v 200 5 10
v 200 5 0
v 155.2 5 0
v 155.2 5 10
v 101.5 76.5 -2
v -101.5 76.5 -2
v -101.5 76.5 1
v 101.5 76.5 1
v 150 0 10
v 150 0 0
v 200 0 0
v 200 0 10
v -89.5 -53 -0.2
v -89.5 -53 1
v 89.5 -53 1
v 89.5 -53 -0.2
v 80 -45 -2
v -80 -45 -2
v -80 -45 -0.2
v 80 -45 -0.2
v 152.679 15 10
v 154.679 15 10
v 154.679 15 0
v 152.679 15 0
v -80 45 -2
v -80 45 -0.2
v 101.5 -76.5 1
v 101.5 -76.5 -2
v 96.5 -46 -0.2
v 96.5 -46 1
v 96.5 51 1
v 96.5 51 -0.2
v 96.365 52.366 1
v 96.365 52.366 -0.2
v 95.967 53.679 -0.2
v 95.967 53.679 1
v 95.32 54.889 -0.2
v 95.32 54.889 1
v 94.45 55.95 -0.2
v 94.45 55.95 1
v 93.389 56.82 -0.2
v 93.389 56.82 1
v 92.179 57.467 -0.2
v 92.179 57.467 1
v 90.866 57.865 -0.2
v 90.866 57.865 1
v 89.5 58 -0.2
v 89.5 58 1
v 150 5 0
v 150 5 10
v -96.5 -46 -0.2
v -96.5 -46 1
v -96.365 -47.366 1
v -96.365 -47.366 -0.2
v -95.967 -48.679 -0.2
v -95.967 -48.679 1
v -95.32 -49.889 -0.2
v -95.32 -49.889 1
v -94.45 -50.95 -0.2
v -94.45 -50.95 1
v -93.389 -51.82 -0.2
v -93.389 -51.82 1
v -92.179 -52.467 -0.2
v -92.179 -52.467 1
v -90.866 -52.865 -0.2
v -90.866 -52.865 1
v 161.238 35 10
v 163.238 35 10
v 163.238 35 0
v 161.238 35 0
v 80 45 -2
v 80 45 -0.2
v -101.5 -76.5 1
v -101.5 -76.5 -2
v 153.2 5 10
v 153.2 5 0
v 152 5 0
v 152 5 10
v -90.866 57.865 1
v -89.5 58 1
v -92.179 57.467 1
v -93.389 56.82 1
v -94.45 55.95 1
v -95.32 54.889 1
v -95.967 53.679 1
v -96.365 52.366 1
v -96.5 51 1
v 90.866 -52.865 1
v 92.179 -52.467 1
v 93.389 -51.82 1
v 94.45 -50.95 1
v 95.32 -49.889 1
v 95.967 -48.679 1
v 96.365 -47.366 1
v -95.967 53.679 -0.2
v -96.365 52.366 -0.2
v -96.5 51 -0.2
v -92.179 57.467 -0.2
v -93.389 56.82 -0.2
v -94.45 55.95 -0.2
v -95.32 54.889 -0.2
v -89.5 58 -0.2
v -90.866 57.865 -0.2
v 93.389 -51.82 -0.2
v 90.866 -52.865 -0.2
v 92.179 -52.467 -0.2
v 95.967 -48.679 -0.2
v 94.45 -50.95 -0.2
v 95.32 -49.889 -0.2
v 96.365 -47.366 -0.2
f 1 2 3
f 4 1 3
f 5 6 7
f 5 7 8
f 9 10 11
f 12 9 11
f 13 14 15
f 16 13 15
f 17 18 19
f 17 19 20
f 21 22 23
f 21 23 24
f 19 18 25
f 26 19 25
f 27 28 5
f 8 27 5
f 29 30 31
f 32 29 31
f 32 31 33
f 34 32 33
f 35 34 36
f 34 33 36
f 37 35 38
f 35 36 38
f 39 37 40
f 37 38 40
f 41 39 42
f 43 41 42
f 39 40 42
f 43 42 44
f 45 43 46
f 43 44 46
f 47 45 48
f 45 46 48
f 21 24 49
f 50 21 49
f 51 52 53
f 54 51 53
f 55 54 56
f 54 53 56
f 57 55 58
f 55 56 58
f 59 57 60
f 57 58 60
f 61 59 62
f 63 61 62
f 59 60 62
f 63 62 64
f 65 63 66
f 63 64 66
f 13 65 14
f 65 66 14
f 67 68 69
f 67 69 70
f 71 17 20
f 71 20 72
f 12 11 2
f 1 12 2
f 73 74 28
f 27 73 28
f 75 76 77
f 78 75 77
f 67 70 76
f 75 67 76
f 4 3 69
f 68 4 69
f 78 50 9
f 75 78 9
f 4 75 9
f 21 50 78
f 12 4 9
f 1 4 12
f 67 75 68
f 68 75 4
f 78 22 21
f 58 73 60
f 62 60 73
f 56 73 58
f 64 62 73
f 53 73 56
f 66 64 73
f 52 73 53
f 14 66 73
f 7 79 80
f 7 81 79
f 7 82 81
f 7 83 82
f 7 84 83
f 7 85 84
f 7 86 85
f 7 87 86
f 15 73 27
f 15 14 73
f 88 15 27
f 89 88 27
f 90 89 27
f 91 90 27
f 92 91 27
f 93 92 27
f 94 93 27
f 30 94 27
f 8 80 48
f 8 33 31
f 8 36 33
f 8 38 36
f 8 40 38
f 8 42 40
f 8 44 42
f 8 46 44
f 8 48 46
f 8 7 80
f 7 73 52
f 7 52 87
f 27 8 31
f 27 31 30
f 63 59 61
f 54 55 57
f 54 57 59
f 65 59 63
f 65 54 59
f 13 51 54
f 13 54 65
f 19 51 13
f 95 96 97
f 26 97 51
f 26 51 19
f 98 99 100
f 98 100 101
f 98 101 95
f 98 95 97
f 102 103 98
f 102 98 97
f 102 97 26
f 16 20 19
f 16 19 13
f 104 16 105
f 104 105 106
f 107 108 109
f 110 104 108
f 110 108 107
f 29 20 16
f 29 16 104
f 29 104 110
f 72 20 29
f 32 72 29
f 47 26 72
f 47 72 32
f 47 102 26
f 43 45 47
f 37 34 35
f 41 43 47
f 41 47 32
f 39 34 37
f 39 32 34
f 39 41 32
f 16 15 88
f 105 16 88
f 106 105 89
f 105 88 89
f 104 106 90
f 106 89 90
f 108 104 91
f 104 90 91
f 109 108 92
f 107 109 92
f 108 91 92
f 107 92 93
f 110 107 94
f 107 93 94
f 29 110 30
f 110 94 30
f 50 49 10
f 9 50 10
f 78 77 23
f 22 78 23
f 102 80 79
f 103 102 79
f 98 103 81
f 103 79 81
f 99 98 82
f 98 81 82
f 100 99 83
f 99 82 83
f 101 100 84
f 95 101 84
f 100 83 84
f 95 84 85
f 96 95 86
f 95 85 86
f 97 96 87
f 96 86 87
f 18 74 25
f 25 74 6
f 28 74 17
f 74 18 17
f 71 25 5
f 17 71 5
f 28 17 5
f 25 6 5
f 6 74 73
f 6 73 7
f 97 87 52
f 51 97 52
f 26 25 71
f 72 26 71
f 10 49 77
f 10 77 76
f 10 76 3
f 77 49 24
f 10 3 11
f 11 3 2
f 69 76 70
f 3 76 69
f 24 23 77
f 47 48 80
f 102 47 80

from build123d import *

# Parameters (mm, degrees)
SKETCH_W     = 203
SKETCH_H     = 153
SKETCH_W_2   = 160
SKETCH_H_2   = 90
PAD_DEPTH    = 3
POCKET_DEPTH = 1.2
PAD001_DEPTH = 10


with BuildPart() as framefront:
    # Sketch (on DatumPlane) → Pad (new body)
    with BuildSketch(Plane.XY.offset(-2)):
        Rectangle(SKETCH_W, SKETCH_H)
        Rectangle(SKETCH_W_2, SKETCH_H_2, mode=Mode.SUBTRACT)
    extrude(amount=PAD_DEPTH)

    # Sketch001 (on Face10 of Pad) → Pocket (cut)
    with BuildSketch(Plane.XY.offset(1)):
        with BuildLine():
            Line((-96.5, 51), (-96.5, -46))
            ThreePointArc((-96.5, -46), (-94.449747, -50.949747), (-89.5, -53))
            Line((-89.5, -53), (89.5, -53))
            ThreePointArc((89.5, -53), (94.449747, -50.949747), (96.5, -46))
            Line((96.5, -46), (96.5, 51))
            ThreePointArc((96.5, 51), (94.449747, 55.949747), (89.5, 58))
            Line((89.5, 58), (-89.5, 58))
            ThreePointArc((-89.5, 58), (-94.449747, 55.949747), (-96.5, 51))
        make_face()
    extrude(amount=-POCKET_DEPTH, mode=Mode.SUBTRACT)


with BuildPart() as stand:
    # Sketch002 → Pad001 (new body)
    with BuildSketch(Plane.XY):
        Polygon((150, 0), (200, 0), (200, 5), (155.2, 5), (163.238476, 35), (161.238476, 35), (153.2, 5), (152, 5), (154.679492, 15), (152.679492, 15), (150, 5), align=None)
    extrude(amount=PAD001_DEPTH)


solid = Compound([framefront.part, stand.part])
